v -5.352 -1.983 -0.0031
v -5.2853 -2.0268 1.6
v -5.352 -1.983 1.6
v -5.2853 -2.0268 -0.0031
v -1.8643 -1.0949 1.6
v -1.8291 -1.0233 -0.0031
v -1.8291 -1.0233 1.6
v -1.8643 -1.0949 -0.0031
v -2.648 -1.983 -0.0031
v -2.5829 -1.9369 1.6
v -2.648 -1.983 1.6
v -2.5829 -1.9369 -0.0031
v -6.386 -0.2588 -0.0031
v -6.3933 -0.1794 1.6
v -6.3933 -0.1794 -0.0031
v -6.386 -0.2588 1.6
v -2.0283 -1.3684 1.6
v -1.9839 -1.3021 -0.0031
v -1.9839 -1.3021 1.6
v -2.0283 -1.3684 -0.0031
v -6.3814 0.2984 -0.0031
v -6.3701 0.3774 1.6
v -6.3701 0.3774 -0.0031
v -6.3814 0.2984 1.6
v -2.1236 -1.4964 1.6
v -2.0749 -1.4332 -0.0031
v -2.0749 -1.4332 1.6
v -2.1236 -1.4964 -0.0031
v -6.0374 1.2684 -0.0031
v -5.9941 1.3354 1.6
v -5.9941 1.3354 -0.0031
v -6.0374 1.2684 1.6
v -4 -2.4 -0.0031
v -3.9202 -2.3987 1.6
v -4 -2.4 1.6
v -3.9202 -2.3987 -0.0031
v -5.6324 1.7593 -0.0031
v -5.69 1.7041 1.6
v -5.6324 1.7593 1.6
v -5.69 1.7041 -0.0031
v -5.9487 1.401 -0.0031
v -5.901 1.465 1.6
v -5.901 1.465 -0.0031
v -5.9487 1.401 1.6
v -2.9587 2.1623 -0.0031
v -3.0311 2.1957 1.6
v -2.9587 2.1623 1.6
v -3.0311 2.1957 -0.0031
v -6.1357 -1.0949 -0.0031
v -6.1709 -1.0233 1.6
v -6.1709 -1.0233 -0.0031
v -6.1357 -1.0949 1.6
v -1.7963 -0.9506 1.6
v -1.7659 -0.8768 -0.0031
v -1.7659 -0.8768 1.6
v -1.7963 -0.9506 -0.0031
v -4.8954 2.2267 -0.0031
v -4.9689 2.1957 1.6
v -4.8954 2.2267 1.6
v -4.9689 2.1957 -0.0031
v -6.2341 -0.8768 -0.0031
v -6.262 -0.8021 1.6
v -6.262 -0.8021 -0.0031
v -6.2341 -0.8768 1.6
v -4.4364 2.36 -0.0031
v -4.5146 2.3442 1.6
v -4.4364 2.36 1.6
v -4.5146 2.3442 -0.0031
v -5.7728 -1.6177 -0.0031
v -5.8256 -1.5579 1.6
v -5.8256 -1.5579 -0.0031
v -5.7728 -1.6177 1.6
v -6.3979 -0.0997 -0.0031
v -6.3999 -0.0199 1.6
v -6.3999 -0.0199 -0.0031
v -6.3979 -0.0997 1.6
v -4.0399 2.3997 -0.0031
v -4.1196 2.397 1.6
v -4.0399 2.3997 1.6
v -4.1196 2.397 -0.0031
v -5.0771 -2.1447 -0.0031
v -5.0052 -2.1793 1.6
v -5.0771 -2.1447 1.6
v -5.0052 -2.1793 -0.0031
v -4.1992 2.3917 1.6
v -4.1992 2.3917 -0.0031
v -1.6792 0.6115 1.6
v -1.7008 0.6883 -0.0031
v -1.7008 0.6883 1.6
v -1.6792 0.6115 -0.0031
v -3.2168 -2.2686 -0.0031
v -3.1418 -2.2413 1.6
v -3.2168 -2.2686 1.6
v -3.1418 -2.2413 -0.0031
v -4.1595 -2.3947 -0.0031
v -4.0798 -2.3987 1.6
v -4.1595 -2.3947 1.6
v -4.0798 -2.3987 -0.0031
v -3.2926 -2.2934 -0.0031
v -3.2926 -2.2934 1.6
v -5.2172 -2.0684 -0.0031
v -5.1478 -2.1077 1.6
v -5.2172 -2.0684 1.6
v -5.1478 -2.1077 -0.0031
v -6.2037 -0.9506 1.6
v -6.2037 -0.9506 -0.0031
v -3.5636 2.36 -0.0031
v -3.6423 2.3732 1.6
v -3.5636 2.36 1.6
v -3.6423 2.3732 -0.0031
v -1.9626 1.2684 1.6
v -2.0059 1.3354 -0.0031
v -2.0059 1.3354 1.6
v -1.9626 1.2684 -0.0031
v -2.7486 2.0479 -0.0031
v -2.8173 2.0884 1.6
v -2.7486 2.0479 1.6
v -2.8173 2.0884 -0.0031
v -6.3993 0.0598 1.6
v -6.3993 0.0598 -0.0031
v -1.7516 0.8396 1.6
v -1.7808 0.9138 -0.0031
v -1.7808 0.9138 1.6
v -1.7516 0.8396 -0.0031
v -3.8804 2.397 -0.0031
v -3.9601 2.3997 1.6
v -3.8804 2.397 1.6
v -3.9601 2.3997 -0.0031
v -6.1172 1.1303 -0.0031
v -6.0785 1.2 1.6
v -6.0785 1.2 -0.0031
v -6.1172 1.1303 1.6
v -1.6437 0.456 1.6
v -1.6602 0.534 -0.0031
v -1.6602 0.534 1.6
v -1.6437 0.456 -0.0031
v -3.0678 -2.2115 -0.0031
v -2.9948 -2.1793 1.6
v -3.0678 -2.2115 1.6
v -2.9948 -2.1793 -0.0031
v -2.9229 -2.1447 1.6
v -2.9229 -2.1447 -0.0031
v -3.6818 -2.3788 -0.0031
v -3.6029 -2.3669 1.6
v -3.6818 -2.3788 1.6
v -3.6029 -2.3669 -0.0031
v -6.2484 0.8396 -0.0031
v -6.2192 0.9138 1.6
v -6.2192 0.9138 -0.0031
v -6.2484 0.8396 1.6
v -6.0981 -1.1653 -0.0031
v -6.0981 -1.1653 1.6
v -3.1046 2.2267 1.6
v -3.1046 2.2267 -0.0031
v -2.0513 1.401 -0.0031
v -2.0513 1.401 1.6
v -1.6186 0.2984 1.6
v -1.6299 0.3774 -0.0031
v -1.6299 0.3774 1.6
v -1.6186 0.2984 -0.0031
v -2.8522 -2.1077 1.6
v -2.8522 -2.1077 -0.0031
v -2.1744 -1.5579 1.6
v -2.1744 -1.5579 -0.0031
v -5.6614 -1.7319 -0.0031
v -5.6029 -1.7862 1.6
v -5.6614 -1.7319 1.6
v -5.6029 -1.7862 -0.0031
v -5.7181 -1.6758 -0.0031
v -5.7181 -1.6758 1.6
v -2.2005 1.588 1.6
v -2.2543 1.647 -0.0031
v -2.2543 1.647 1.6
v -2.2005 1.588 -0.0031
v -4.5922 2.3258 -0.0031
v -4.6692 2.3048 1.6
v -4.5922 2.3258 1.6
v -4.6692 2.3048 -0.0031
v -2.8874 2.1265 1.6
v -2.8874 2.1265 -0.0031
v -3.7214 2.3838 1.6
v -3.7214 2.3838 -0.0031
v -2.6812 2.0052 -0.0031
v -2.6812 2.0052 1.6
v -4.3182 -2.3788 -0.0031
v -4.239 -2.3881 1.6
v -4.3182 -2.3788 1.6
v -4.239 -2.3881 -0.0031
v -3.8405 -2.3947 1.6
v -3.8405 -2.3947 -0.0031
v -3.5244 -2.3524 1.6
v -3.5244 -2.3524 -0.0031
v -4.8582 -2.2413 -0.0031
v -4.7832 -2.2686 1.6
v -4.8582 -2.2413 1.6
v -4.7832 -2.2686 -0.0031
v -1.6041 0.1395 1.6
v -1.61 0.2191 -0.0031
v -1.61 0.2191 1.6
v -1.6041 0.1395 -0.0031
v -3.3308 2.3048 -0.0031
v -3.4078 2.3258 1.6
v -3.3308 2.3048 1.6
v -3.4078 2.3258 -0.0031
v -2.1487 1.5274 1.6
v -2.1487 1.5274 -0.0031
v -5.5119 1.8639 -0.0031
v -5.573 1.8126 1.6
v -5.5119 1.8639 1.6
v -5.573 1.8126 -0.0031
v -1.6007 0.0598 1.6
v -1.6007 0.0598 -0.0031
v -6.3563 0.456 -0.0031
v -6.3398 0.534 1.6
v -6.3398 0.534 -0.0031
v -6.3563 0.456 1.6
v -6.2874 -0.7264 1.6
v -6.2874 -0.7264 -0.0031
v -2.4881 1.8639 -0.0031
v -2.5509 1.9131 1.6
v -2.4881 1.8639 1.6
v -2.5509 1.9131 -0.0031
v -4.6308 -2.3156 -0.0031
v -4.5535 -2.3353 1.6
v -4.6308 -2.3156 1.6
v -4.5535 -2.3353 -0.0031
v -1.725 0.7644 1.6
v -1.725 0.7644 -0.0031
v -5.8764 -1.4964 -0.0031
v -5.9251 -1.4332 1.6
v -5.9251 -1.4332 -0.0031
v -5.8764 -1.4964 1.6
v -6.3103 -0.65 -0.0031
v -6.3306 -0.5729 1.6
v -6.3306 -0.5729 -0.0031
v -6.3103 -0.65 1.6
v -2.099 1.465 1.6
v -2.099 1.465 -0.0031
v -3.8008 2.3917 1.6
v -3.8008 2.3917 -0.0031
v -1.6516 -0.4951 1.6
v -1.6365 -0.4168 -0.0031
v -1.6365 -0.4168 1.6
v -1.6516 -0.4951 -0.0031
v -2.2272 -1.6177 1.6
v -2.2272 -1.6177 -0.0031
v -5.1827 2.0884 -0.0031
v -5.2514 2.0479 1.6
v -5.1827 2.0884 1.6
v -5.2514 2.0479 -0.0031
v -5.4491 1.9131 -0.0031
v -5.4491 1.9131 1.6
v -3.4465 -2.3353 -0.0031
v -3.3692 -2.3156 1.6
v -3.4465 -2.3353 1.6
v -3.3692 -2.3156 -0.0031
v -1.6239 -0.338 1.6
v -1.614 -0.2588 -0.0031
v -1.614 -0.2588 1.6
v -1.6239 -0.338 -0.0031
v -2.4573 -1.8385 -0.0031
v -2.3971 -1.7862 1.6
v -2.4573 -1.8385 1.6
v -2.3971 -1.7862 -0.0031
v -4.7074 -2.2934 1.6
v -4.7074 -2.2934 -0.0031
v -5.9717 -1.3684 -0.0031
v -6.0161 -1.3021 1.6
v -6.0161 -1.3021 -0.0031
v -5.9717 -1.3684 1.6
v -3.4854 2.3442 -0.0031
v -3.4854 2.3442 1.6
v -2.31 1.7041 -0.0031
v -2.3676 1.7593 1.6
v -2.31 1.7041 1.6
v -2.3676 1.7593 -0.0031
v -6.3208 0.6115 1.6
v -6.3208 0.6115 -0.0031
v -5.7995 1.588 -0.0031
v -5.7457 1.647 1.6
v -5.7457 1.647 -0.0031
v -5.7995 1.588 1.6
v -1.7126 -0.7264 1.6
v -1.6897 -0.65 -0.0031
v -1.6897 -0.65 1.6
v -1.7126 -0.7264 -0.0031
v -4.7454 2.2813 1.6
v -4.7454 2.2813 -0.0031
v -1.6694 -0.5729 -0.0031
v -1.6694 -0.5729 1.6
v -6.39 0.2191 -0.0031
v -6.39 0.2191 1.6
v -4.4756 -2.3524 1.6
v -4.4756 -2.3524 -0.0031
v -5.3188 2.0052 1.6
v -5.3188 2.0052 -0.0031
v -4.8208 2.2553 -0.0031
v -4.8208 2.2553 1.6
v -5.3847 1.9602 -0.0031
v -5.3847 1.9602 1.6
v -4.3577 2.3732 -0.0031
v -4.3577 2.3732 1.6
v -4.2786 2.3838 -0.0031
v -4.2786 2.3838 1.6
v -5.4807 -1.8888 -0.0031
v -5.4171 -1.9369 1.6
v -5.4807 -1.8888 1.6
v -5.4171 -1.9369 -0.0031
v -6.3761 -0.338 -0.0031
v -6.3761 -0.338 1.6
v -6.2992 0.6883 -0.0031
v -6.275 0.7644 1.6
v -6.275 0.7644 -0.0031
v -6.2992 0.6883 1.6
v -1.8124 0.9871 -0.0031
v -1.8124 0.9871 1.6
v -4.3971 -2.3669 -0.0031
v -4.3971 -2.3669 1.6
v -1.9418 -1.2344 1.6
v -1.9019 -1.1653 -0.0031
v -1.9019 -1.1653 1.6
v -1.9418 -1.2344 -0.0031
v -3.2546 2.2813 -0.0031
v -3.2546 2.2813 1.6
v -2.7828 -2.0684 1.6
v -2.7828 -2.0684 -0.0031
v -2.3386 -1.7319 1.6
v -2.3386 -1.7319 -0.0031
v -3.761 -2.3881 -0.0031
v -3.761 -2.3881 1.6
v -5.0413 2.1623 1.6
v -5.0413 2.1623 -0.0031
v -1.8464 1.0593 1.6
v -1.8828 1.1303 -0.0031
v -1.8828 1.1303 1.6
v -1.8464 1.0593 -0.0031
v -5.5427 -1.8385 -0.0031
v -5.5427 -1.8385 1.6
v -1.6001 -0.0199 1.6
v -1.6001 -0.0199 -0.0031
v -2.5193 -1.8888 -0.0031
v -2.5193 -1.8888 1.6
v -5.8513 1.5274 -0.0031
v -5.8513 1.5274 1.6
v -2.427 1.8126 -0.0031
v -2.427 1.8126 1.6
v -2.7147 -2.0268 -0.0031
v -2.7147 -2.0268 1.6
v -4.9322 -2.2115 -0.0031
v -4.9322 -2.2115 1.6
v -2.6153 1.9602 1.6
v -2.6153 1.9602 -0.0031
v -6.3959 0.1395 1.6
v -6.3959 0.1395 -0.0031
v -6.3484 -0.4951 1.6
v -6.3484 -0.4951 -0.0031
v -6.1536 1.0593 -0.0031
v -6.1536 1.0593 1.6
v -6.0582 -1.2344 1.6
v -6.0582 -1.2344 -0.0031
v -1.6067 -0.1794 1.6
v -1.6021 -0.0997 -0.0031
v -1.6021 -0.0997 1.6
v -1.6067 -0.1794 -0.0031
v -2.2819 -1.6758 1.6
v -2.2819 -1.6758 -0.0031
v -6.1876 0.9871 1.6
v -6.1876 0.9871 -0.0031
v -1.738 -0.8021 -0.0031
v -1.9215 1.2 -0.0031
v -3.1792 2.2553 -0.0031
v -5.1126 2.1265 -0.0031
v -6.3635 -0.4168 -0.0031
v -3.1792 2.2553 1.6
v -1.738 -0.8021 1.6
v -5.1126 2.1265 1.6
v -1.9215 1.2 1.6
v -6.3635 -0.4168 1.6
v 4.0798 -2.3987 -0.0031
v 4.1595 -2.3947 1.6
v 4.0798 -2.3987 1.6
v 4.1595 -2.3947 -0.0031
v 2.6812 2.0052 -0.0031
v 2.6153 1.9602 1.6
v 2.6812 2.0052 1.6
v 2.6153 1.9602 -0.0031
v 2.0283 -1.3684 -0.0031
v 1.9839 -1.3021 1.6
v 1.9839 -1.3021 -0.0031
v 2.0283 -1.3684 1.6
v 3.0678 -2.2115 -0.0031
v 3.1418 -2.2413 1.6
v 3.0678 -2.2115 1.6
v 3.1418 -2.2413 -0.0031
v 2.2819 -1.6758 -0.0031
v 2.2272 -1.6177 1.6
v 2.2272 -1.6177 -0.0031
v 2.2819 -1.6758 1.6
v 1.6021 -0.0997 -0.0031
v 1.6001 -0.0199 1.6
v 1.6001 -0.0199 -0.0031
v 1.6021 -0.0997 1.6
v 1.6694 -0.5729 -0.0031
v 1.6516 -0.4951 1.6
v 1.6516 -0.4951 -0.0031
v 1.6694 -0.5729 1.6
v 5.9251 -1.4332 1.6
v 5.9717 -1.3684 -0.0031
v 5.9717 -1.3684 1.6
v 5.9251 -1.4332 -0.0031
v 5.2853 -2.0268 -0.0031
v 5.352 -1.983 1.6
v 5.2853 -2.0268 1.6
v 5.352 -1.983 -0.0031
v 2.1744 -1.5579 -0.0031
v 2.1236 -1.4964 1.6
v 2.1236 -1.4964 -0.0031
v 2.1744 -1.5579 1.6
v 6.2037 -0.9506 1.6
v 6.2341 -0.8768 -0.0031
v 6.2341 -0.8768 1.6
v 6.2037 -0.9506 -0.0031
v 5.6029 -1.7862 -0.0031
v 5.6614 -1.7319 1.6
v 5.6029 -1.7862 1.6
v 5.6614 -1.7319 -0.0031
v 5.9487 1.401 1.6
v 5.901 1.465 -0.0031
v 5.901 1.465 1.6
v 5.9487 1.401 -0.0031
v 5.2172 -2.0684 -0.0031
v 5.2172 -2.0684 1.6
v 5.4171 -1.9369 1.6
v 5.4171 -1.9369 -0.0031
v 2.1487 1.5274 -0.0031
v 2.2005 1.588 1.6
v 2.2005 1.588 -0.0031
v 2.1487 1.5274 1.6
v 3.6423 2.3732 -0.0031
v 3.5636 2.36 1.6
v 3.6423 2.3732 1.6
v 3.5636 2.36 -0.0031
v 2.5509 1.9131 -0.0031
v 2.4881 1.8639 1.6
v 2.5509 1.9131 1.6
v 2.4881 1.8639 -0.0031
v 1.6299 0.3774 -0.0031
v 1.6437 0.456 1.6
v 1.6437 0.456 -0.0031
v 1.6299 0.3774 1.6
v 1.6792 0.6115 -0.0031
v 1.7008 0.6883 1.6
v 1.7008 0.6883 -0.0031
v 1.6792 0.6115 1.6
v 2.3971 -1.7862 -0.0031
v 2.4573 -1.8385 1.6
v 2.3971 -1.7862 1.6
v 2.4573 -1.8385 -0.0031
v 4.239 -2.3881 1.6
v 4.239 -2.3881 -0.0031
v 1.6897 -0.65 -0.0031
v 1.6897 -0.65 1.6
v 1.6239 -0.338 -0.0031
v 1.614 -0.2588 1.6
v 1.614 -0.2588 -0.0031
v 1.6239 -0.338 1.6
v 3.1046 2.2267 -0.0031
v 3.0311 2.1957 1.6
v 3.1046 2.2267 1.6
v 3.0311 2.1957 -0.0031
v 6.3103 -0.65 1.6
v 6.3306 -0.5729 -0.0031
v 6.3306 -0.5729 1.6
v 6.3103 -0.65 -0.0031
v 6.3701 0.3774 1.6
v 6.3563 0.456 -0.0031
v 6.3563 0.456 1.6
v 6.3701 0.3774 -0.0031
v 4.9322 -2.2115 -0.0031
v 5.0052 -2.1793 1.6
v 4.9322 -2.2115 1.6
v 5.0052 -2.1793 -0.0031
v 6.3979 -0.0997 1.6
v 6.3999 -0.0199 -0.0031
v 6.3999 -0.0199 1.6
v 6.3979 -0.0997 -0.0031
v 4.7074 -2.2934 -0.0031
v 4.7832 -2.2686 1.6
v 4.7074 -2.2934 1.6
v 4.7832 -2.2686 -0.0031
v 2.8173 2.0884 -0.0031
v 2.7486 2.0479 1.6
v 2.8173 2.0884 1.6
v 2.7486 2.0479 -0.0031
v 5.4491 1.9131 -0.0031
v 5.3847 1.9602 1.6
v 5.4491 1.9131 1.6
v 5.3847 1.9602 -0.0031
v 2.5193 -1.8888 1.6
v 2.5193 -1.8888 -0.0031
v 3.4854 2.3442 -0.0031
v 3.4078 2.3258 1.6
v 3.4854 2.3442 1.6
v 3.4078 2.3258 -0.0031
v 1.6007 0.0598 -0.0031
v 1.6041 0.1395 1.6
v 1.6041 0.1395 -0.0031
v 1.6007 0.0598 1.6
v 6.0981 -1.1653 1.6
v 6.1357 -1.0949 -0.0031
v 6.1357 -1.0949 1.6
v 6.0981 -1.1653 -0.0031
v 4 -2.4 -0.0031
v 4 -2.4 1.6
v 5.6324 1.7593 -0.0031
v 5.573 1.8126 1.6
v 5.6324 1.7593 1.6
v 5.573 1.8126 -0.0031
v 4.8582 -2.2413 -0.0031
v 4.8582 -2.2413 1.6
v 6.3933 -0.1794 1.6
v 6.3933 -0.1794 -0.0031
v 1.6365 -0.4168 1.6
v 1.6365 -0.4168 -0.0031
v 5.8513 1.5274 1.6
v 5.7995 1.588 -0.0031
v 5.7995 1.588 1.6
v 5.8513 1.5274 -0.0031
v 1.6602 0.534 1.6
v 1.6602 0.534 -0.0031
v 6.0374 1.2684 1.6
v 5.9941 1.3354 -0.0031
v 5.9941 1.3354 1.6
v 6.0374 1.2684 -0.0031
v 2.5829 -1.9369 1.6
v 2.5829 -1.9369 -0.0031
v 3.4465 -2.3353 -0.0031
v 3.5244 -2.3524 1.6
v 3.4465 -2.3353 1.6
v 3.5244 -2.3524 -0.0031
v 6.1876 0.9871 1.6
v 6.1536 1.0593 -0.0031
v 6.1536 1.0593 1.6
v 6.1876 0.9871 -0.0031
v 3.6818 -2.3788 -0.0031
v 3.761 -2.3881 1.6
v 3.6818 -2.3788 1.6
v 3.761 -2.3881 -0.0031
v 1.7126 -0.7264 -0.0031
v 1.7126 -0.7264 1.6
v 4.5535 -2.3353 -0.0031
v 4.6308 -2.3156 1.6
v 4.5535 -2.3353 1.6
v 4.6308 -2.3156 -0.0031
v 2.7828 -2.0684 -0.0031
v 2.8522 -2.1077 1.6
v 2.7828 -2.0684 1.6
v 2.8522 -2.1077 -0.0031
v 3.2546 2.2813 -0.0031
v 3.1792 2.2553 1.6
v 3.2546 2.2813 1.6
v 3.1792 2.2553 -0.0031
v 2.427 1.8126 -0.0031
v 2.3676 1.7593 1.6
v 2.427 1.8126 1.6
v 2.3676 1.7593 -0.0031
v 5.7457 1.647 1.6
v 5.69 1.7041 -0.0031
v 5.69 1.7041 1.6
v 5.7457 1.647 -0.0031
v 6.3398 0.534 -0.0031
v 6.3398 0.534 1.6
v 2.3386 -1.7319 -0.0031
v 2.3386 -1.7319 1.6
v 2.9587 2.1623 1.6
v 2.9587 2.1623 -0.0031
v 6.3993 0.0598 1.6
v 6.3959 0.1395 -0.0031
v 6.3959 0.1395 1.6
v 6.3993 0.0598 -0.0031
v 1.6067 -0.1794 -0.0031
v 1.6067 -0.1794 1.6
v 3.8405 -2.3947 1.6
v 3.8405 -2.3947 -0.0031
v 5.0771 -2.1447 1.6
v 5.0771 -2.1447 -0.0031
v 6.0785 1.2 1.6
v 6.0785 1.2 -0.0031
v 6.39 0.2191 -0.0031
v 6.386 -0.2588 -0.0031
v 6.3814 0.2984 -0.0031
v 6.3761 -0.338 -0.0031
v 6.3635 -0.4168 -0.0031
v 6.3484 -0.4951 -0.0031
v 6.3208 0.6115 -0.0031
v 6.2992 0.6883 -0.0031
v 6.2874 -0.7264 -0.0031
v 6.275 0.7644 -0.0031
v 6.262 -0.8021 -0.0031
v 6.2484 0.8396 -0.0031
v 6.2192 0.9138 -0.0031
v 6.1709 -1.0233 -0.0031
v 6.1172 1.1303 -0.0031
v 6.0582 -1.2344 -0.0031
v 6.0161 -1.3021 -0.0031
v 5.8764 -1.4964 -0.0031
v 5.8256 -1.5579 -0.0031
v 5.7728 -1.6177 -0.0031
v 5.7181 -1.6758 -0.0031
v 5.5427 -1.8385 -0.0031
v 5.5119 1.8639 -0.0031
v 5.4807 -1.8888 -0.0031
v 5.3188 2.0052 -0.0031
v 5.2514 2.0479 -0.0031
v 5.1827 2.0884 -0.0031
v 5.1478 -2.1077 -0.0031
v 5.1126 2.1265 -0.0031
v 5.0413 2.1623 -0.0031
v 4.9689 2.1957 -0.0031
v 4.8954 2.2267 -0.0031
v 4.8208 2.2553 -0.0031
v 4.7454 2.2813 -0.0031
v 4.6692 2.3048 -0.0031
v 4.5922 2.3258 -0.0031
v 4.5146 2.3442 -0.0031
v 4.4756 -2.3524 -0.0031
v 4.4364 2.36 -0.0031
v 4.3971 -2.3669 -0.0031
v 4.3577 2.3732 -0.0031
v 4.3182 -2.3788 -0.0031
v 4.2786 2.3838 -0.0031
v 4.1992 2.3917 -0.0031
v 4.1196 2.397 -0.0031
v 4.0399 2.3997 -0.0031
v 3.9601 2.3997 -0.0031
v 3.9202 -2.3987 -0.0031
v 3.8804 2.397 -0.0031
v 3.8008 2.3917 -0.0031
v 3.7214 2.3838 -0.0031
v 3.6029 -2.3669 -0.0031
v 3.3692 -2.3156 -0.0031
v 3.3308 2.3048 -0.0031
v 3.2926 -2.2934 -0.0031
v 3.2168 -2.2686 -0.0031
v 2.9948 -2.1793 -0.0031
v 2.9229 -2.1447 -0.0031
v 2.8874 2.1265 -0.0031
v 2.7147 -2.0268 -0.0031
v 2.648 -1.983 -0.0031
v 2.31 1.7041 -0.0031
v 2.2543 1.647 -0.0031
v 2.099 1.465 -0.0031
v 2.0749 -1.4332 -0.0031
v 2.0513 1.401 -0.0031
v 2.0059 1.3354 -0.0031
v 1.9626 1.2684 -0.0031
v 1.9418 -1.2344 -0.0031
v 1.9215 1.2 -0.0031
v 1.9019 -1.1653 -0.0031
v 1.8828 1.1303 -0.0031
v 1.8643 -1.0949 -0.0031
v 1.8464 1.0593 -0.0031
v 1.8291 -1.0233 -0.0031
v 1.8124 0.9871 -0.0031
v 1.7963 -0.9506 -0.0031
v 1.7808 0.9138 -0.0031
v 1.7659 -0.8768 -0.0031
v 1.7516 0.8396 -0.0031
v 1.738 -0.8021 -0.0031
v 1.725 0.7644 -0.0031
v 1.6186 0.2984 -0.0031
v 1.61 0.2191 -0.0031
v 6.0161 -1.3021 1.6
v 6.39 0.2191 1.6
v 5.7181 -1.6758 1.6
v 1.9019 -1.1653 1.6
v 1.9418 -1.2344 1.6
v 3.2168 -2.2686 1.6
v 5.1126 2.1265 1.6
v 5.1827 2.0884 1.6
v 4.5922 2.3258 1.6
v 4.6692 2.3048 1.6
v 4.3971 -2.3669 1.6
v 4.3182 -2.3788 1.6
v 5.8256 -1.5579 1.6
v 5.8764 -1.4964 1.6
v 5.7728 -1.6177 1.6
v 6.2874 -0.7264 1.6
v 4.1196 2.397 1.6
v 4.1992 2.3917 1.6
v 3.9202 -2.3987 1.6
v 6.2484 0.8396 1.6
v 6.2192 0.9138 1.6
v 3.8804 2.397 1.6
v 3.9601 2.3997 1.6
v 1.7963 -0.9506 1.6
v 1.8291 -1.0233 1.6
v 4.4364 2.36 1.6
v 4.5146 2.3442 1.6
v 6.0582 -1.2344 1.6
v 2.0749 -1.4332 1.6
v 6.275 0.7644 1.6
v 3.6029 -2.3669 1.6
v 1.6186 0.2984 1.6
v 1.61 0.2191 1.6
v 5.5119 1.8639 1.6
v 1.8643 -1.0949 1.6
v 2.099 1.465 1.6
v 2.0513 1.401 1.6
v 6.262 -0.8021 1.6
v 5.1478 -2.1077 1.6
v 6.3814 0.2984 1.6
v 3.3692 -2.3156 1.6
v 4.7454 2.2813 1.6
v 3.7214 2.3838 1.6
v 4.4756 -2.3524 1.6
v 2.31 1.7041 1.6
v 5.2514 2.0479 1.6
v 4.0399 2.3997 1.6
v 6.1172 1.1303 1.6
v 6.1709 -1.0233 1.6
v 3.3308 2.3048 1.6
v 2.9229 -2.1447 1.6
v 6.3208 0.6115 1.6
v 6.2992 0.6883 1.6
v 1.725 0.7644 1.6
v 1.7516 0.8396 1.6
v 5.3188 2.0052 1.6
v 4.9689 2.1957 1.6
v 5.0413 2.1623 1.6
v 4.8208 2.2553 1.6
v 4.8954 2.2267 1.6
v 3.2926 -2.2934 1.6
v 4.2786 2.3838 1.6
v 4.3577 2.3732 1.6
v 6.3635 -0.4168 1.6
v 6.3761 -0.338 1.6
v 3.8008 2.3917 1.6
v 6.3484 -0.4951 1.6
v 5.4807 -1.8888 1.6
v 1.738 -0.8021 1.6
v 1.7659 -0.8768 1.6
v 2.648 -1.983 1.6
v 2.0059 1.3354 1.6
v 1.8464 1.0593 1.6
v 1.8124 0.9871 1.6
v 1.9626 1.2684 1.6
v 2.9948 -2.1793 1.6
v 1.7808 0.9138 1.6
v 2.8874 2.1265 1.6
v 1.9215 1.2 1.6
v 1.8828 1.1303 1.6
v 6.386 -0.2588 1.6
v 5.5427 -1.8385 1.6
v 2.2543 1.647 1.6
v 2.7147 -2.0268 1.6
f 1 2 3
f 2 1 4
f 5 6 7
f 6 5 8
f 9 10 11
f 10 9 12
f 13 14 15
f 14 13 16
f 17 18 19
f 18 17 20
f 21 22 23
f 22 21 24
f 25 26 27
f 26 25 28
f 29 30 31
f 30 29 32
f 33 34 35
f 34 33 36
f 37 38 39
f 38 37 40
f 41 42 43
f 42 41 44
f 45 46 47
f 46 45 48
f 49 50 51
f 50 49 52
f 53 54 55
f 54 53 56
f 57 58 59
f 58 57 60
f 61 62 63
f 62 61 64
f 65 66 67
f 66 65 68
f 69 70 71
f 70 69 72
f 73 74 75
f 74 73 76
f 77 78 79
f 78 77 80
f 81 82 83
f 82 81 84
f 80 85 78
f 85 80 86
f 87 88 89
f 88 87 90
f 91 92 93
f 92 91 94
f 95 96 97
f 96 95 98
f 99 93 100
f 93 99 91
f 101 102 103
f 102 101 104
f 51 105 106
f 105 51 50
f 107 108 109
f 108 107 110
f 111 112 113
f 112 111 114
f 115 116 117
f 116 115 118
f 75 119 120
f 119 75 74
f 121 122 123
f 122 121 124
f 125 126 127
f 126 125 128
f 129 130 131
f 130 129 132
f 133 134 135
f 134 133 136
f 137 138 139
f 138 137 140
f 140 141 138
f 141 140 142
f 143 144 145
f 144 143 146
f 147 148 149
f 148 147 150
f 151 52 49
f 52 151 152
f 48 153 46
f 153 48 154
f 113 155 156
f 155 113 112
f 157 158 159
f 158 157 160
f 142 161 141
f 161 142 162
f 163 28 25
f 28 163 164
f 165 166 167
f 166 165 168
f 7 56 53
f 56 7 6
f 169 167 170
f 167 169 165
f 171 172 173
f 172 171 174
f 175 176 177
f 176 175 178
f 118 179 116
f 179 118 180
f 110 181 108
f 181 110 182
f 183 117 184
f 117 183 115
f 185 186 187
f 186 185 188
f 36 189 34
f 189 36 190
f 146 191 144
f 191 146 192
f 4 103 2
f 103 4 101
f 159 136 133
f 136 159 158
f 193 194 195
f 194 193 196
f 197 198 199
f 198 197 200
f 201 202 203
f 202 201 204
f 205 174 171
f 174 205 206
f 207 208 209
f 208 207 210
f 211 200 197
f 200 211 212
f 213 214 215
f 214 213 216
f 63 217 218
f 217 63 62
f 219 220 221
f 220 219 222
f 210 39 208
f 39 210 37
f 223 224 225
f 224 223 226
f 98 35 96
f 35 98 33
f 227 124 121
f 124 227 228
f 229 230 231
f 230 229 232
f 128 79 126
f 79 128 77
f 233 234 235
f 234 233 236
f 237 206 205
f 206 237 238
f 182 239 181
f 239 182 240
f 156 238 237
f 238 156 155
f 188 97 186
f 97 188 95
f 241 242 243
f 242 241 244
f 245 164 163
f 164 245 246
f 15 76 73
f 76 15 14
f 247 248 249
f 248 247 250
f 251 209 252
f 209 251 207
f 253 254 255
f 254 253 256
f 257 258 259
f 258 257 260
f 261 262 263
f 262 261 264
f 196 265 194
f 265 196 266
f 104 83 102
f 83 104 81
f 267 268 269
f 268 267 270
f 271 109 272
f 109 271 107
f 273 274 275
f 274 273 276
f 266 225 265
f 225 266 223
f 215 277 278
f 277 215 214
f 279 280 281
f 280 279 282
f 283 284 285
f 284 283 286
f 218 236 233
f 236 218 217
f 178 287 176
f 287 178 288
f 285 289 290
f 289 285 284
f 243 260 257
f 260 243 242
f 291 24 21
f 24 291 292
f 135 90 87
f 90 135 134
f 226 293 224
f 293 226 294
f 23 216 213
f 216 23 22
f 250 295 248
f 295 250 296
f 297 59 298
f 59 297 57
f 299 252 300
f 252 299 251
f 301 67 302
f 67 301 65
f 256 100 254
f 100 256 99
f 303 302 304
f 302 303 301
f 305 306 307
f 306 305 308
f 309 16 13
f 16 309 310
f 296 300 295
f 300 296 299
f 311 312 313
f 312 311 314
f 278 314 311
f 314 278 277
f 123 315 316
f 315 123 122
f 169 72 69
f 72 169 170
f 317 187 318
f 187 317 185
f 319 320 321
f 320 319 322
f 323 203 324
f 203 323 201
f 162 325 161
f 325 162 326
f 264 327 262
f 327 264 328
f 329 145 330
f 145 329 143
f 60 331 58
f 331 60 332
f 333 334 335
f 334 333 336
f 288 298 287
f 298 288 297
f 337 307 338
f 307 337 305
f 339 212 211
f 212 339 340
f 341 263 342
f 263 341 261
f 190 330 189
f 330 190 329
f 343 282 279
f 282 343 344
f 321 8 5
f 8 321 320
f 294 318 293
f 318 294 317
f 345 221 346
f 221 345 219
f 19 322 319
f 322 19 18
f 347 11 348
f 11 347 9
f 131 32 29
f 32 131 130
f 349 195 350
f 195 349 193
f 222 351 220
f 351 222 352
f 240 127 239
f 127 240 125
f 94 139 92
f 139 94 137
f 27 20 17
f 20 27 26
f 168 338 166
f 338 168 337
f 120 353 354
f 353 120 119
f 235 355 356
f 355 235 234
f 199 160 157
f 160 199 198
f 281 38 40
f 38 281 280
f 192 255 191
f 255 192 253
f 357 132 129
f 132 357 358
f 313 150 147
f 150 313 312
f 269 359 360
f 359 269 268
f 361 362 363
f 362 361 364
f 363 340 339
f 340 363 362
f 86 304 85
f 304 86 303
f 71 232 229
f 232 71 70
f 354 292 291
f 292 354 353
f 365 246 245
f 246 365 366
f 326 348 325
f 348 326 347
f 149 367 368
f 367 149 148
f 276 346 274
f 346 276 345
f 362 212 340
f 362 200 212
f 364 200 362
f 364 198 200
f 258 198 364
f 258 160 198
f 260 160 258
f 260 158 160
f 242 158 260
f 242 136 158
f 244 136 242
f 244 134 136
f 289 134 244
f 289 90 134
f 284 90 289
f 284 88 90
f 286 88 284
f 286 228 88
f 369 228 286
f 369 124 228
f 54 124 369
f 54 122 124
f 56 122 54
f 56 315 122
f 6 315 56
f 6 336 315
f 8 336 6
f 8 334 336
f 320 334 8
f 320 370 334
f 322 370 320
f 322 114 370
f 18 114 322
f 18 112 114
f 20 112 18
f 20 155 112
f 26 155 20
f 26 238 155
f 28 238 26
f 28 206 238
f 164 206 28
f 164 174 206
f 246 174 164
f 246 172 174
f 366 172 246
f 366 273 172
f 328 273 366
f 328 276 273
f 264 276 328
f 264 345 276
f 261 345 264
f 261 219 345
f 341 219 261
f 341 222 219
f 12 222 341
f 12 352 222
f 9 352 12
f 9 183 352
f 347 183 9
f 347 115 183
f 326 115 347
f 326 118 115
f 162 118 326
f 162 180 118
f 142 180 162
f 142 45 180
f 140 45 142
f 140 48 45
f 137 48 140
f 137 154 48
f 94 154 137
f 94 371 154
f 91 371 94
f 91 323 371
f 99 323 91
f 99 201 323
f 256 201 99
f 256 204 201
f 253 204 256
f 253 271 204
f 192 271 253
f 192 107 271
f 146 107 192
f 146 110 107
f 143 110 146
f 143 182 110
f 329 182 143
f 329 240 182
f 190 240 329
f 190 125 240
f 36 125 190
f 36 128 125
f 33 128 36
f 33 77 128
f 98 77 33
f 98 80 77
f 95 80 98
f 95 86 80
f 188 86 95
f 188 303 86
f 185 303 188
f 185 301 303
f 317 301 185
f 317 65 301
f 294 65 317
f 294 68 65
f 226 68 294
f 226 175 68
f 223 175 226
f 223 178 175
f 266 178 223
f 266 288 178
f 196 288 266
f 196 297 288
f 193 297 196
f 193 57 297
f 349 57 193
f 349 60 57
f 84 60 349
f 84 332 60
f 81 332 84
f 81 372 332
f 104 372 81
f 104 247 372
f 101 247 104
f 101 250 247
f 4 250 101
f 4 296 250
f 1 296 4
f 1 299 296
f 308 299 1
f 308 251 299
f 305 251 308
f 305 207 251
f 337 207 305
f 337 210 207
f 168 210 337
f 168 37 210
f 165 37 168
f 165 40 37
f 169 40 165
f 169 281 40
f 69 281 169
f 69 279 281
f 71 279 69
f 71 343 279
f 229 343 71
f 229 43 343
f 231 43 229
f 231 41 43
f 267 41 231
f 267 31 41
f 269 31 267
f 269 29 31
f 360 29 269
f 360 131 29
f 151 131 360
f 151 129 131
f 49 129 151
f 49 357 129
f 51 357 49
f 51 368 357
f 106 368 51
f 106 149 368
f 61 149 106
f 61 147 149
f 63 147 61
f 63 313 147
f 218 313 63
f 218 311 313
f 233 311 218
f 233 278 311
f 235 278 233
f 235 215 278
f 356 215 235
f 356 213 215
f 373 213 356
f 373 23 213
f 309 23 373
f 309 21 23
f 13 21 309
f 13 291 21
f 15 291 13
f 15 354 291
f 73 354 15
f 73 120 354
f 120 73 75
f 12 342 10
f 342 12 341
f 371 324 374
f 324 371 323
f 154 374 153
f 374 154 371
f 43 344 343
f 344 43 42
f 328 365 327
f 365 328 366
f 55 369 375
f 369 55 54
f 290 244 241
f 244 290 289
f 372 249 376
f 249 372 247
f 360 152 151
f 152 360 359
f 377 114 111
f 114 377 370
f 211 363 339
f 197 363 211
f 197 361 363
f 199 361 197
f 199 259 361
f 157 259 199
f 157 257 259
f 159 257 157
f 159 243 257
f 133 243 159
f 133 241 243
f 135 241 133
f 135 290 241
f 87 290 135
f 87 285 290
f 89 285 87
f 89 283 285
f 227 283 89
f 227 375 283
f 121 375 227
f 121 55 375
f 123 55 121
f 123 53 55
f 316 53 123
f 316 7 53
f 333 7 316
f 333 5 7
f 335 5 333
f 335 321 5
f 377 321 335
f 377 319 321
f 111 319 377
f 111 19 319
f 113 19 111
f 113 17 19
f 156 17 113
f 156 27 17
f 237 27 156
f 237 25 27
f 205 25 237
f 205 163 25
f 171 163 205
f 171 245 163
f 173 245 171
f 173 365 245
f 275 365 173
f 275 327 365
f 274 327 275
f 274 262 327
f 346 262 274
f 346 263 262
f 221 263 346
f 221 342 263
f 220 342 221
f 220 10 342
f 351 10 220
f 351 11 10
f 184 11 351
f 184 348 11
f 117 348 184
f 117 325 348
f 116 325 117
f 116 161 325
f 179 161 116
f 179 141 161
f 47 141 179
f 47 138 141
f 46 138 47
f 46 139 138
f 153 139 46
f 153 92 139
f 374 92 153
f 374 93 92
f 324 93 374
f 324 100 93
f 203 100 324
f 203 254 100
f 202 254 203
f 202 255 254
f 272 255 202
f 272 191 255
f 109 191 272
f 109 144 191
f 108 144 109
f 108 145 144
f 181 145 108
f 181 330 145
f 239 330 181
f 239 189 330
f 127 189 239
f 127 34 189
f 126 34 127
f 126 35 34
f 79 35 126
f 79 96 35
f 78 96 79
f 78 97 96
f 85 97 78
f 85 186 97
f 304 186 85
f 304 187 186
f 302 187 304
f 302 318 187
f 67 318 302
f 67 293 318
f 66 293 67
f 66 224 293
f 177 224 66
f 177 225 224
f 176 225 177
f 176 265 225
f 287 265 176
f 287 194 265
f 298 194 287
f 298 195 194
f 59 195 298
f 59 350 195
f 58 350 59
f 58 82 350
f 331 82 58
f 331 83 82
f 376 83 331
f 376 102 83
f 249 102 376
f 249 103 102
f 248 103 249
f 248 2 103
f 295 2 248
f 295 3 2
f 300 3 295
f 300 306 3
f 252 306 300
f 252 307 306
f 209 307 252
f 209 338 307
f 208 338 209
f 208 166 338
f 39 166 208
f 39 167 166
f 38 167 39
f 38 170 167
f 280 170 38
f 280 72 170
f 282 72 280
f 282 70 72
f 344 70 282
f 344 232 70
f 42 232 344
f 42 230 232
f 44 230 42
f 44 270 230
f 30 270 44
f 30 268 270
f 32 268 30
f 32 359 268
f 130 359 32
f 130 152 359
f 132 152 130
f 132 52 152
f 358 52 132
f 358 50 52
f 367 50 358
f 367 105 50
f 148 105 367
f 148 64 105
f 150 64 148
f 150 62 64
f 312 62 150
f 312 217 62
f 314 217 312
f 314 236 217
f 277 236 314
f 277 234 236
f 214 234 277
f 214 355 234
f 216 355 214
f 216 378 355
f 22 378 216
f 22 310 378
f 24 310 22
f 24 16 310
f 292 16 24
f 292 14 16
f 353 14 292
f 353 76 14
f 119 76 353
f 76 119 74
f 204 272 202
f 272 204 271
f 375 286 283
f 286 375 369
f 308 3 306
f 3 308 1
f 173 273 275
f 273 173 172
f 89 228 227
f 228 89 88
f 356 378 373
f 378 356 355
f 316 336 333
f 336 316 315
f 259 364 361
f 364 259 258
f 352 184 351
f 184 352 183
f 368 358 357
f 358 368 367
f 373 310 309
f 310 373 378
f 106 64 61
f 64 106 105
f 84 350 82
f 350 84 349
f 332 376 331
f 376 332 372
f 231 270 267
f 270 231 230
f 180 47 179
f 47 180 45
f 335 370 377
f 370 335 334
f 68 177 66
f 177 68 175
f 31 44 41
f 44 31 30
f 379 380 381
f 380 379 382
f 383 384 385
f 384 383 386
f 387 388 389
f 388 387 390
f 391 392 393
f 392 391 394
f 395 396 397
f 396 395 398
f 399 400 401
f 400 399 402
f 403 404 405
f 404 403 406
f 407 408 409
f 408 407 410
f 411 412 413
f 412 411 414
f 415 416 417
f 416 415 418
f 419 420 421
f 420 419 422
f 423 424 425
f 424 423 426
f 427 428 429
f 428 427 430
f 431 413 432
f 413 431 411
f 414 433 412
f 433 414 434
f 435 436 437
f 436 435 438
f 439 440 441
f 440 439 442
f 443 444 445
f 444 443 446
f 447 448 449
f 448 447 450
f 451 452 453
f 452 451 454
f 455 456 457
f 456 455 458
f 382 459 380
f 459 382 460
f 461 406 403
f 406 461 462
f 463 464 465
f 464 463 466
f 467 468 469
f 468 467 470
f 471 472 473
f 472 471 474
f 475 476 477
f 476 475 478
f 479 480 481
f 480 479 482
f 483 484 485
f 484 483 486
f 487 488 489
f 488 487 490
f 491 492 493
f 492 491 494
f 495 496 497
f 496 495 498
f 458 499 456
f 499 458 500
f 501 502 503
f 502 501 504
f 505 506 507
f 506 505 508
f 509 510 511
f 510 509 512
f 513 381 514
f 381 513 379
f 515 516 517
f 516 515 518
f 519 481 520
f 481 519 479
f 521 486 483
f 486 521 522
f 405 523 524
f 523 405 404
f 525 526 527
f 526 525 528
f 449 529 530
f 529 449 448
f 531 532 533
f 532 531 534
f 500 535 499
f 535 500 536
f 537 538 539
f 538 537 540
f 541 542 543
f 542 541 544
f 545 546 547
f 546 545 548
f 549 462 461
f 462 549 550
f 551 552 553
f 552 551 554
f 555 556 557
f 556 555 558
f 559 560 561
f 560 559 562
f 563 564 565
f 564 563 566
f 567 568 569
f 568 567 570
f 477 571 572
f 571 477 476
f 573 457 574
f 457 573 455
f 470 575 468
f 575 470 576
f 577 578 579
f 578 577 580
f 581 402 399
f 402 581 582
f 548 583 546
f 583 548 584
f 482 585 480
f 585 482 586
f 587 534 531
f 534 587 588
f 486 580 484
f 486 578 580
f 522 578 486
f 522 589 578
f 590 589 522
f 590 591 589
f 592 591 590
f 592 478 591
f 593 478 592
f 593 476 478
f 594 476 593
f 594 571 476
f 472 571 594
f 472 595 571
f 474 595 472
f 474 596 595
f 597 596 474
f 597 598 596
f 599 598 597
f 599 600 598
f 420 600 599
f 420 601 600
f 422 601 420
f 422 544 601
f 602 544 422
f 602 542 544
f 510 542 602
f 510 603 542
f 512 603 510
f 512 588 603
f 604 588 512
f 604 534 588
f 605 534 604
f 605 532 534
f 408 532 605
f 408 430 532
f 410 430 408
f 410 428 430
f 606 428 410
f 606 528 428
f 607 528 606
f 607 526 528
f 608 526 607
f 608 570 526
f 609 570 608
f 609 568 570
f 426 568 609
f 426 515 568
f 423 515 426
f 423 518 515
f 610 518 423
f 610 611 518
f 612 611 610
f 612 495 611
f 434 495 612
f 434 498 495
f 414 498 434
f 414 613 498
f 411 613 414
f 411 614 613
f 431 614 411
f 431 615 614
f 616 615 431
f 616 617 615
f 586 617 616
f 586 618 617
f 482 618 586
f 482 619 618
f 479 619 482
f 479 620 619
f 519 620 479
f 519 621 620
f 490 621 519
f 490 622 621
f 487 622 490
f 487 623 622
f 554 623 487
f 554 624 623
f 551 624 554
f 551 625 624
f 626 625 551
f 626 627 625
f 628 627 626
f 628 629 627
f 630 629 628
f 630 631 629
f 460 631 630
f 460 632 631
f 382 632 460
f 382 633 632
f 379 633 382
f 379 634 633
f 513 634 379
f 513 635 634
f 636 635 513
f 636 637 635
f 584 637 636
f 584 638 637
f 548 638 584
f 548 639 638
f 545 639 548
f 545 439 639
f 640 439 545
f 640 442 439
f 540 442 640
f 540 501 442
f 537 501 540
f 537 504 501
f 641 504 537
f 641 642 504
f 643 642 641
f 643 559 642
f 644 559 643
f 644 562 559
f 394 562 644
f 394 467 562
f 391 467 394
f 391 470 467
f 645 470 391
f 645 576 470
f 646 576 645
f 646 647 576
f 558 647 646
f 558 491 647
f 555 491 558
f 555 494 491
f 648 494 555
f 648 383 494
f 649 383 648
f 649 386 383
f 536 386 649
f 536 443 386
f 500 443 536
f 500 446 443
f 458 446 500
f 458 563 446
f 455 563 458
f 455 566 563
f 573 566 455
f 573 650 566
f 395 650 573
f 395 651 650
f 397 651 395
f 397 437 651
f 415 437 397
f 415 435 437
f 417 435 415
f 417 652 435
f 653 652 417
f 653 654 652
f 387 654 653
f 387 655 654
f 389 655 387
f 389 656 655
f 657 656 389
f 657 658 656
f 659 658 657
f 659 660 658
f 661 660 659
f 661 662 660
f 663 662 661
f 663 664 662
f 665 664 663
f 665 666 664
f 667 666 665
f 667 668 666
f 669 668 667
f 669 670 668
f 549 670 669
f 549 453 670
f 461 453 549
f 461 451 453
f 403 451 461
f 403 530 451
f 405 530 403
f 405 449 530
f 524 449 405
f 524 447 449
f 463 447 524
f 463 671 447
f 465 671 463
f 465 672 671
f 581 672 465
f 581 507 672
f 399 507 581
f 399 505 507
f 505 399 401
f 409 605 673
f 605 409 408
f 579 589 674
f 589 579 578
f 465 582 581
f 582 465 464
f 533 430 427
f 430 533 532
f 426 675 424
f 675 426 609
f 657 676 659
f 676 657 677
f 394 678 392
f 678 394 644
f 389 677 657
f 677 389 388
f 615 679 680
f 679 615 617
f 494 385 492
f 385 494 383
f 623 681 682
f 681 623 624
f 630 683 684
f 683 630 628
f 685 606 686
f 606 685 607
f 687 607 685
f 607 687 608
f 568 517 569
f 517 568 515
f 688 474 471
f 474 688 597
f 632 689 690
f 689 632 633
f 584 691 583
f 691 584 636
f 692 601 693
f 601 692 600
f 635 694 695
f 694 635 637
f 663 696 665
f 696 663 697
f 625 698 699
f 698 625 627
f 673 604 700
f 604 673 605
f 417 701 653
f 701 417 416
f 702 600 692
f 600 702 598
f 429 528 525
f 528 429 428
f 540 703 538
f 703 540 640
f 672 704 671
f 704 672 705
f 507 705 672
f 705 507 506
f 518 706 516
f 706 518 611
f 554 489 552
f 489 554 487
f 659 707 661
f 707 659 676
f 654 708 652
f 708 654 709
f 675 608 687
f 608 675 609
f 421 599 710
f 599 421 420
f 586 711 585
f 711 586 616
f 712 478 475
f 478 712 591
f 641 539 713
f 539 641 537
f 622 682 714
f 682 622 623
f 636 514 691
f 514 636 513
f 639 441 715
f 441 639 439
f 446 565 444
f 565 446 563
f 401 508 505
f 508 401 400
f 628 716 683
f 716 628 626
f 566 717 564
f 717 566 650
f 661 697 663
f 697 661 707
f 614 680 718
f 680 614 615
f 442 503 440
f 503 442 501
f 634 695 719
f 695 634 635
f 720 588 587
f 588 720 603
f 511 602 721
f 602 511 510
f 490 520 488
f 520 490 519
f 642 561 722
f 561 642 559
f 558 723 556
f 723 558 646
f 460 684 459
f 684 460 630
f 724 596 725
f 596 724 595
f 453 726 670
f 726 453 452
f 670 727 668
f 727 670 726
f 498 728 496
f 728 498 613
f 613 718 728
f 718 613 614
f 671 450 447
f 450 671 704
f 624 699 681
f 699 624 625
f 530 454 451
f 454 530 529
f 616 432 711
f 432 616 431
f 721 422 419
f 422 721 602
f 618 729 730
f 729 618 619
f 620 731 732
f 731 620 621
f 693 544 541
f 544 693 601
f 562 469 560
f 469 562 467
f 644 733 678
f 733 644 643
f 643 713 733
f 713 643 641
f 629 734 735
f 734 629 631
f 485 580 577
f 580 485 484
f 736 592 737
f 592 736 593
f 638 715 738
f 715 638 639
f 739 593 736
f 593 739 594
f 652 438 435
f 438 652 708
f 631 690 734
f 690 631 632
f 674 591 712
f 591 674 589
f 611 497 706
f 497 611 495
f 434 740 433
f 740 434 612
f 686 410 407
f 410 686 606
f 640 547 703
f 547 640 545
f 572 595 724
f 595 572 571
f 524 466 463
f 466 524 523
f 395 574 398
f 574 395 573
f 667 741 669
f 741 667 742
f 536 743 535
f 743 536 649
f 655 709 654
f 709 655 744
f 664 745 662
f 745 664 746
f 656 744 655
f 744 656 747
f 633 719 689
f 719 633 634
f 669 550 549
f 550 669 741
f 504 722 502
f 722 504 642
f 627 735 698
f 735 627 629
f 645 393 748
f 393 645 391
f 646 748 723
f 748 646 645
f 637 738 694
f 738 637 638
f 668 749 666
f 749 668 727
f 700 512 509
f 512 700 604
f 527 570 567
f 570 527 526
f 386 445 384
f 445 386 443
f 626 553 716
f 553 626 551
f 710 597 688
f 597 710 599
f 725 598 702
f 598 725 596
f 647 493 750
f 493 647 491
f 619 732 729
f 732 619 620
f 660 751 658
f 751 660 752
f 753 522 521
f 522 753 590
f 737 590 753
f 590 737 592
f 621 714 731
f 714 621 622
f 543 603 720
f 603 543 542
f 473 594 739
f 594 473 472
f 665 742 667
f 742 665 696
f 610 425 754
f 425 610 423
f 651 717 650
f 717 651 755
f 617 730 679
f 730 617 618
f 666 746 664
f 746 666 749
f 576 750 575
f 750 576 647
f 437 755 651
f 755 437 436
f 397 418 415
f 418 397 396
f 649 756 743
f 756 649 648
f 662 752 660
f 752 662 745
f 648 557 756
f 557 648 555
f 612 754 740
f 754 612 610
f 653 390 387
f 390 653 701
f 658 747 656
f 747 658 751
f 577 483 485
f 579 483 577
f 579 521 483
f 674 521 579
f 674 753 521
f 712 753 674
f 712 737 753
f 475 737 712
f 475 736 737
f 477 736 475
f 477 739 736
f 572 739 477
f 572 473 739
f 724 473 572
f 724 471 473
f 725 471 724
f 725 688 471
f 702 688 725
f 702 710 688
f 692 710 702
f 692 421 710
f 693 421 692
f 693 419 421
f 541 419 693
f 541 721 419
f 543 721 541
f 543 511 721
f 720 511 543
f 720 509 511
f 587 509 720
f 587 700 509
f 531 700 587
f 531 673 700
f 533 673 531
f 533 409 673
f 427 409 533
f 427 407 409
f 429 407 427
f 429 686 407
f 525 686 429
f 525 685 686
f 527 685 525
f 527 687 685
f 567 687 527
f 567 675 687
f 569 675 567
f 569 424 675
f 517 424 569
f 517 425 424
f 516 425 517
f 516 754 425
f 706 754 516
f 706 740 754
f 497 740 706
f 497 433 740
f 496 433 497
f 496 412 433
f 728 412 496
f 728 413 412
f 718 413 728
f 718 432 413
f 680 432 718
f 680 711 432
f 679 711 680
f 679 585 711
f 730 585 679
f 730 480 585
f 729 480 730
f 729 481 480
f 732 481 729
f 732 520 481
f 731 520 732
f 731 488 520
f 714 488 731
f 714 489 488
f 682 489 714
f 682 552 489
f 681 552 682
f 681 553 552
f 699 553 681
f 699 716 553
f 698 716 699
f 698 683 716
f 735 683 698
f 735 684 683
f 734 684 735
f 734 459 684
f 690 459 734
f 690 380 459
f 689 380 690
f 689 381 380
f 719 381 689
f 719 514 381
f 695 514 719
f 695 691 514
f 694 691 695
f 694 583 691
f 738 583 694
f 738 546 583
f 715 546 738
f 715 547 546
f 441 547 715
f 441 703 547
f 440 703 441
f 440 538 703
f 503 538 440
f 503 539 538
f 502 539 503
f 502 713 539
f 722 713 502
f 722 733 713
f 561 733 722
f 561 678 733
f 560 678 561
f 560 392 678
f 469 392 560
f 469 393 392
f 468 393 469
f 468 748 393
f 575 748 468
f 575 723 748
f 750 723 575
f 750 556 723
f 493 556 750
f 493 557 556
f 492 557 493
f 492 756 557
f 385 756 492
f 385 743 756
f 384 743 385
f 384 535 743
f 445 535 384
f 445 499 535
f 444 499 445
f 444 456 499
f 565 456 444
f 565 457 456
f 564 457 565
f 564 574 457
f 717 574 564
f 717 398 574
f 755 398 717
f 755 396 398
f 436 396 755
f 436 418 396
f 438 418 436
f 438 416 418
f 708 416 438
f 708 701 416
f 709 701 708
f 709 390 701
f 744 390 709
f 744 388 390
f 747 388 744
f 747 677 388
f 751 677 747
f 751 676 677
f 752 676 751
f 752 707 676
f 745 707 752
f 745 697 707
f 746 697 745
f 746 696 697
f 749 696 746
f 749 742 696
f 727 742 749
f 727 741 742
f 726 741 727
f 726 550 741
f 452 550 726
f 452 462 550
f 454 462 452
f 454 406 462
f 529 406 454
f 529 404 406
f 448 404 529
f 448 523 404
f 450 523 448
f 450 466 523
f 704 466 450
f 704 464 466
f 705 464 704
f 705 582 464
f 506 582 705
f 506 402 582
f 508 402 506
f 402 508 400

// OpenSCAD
use <../lib.scad>
use <3245c.scad>
use <6005724g.scad>
$fa=1; $fs=0.2;
function ldraw_lib__3245cdm0(realsolid=false) = [
// 0 Brick  1 x  2 x  2 with Narrow Bricks Sticker
// 0 Name: 3245cdm0.dat
// 0 Author: Christian Neumann [Wesley]
// 0 !LDRAW_ORG Shortcut UPDATE 2014-02
// 0 !LICENSE Licensed under CC BY 2.0 and CC BY 4.0 : see CAreadme.txt
// 
// 0 BFC CERTIFY CCW
  [0,"BFC","CERTIFY"],
  [0,"BFC","CCW"],
// 
// 0 !KEYWORDS Lord of the Rings, LOTR, Mines of Moria, Set 9473
// 
// 0 !CMDLINE -c71
// 
// 0 !HISTORY 2014-12-23 [PTadmin] Official Update 2014-02
// 
// 
// 1 16 0 0 0 1 0 0 0 1 0 0 0 1 3245c.dat
  [1,16,0,0,0,1,0,0,0,1,0,0,0,1, ldraw_lib__3245c(realsolid)],
// 1 16 0 12 -10 1 0 0 0 0 -1 0 1 0 6005724g.dat
  [1,16,0,12,-10,1,0,0,0,0,-1,0,1,0, ldraw_lib__6005724g(realsolid)],
];
module ldraw_lib__3245cdm0(step=0, col=false, unit=2/5, alt=false, line=0.2, solid=!$preview)
    makepoly(ldraw_lib__3245cdm0(solid), step=step, col=col, unit=unit, alt=alt, line=line, solid=solid);
ldraw_lib__3245cdm0(line=0.2);
